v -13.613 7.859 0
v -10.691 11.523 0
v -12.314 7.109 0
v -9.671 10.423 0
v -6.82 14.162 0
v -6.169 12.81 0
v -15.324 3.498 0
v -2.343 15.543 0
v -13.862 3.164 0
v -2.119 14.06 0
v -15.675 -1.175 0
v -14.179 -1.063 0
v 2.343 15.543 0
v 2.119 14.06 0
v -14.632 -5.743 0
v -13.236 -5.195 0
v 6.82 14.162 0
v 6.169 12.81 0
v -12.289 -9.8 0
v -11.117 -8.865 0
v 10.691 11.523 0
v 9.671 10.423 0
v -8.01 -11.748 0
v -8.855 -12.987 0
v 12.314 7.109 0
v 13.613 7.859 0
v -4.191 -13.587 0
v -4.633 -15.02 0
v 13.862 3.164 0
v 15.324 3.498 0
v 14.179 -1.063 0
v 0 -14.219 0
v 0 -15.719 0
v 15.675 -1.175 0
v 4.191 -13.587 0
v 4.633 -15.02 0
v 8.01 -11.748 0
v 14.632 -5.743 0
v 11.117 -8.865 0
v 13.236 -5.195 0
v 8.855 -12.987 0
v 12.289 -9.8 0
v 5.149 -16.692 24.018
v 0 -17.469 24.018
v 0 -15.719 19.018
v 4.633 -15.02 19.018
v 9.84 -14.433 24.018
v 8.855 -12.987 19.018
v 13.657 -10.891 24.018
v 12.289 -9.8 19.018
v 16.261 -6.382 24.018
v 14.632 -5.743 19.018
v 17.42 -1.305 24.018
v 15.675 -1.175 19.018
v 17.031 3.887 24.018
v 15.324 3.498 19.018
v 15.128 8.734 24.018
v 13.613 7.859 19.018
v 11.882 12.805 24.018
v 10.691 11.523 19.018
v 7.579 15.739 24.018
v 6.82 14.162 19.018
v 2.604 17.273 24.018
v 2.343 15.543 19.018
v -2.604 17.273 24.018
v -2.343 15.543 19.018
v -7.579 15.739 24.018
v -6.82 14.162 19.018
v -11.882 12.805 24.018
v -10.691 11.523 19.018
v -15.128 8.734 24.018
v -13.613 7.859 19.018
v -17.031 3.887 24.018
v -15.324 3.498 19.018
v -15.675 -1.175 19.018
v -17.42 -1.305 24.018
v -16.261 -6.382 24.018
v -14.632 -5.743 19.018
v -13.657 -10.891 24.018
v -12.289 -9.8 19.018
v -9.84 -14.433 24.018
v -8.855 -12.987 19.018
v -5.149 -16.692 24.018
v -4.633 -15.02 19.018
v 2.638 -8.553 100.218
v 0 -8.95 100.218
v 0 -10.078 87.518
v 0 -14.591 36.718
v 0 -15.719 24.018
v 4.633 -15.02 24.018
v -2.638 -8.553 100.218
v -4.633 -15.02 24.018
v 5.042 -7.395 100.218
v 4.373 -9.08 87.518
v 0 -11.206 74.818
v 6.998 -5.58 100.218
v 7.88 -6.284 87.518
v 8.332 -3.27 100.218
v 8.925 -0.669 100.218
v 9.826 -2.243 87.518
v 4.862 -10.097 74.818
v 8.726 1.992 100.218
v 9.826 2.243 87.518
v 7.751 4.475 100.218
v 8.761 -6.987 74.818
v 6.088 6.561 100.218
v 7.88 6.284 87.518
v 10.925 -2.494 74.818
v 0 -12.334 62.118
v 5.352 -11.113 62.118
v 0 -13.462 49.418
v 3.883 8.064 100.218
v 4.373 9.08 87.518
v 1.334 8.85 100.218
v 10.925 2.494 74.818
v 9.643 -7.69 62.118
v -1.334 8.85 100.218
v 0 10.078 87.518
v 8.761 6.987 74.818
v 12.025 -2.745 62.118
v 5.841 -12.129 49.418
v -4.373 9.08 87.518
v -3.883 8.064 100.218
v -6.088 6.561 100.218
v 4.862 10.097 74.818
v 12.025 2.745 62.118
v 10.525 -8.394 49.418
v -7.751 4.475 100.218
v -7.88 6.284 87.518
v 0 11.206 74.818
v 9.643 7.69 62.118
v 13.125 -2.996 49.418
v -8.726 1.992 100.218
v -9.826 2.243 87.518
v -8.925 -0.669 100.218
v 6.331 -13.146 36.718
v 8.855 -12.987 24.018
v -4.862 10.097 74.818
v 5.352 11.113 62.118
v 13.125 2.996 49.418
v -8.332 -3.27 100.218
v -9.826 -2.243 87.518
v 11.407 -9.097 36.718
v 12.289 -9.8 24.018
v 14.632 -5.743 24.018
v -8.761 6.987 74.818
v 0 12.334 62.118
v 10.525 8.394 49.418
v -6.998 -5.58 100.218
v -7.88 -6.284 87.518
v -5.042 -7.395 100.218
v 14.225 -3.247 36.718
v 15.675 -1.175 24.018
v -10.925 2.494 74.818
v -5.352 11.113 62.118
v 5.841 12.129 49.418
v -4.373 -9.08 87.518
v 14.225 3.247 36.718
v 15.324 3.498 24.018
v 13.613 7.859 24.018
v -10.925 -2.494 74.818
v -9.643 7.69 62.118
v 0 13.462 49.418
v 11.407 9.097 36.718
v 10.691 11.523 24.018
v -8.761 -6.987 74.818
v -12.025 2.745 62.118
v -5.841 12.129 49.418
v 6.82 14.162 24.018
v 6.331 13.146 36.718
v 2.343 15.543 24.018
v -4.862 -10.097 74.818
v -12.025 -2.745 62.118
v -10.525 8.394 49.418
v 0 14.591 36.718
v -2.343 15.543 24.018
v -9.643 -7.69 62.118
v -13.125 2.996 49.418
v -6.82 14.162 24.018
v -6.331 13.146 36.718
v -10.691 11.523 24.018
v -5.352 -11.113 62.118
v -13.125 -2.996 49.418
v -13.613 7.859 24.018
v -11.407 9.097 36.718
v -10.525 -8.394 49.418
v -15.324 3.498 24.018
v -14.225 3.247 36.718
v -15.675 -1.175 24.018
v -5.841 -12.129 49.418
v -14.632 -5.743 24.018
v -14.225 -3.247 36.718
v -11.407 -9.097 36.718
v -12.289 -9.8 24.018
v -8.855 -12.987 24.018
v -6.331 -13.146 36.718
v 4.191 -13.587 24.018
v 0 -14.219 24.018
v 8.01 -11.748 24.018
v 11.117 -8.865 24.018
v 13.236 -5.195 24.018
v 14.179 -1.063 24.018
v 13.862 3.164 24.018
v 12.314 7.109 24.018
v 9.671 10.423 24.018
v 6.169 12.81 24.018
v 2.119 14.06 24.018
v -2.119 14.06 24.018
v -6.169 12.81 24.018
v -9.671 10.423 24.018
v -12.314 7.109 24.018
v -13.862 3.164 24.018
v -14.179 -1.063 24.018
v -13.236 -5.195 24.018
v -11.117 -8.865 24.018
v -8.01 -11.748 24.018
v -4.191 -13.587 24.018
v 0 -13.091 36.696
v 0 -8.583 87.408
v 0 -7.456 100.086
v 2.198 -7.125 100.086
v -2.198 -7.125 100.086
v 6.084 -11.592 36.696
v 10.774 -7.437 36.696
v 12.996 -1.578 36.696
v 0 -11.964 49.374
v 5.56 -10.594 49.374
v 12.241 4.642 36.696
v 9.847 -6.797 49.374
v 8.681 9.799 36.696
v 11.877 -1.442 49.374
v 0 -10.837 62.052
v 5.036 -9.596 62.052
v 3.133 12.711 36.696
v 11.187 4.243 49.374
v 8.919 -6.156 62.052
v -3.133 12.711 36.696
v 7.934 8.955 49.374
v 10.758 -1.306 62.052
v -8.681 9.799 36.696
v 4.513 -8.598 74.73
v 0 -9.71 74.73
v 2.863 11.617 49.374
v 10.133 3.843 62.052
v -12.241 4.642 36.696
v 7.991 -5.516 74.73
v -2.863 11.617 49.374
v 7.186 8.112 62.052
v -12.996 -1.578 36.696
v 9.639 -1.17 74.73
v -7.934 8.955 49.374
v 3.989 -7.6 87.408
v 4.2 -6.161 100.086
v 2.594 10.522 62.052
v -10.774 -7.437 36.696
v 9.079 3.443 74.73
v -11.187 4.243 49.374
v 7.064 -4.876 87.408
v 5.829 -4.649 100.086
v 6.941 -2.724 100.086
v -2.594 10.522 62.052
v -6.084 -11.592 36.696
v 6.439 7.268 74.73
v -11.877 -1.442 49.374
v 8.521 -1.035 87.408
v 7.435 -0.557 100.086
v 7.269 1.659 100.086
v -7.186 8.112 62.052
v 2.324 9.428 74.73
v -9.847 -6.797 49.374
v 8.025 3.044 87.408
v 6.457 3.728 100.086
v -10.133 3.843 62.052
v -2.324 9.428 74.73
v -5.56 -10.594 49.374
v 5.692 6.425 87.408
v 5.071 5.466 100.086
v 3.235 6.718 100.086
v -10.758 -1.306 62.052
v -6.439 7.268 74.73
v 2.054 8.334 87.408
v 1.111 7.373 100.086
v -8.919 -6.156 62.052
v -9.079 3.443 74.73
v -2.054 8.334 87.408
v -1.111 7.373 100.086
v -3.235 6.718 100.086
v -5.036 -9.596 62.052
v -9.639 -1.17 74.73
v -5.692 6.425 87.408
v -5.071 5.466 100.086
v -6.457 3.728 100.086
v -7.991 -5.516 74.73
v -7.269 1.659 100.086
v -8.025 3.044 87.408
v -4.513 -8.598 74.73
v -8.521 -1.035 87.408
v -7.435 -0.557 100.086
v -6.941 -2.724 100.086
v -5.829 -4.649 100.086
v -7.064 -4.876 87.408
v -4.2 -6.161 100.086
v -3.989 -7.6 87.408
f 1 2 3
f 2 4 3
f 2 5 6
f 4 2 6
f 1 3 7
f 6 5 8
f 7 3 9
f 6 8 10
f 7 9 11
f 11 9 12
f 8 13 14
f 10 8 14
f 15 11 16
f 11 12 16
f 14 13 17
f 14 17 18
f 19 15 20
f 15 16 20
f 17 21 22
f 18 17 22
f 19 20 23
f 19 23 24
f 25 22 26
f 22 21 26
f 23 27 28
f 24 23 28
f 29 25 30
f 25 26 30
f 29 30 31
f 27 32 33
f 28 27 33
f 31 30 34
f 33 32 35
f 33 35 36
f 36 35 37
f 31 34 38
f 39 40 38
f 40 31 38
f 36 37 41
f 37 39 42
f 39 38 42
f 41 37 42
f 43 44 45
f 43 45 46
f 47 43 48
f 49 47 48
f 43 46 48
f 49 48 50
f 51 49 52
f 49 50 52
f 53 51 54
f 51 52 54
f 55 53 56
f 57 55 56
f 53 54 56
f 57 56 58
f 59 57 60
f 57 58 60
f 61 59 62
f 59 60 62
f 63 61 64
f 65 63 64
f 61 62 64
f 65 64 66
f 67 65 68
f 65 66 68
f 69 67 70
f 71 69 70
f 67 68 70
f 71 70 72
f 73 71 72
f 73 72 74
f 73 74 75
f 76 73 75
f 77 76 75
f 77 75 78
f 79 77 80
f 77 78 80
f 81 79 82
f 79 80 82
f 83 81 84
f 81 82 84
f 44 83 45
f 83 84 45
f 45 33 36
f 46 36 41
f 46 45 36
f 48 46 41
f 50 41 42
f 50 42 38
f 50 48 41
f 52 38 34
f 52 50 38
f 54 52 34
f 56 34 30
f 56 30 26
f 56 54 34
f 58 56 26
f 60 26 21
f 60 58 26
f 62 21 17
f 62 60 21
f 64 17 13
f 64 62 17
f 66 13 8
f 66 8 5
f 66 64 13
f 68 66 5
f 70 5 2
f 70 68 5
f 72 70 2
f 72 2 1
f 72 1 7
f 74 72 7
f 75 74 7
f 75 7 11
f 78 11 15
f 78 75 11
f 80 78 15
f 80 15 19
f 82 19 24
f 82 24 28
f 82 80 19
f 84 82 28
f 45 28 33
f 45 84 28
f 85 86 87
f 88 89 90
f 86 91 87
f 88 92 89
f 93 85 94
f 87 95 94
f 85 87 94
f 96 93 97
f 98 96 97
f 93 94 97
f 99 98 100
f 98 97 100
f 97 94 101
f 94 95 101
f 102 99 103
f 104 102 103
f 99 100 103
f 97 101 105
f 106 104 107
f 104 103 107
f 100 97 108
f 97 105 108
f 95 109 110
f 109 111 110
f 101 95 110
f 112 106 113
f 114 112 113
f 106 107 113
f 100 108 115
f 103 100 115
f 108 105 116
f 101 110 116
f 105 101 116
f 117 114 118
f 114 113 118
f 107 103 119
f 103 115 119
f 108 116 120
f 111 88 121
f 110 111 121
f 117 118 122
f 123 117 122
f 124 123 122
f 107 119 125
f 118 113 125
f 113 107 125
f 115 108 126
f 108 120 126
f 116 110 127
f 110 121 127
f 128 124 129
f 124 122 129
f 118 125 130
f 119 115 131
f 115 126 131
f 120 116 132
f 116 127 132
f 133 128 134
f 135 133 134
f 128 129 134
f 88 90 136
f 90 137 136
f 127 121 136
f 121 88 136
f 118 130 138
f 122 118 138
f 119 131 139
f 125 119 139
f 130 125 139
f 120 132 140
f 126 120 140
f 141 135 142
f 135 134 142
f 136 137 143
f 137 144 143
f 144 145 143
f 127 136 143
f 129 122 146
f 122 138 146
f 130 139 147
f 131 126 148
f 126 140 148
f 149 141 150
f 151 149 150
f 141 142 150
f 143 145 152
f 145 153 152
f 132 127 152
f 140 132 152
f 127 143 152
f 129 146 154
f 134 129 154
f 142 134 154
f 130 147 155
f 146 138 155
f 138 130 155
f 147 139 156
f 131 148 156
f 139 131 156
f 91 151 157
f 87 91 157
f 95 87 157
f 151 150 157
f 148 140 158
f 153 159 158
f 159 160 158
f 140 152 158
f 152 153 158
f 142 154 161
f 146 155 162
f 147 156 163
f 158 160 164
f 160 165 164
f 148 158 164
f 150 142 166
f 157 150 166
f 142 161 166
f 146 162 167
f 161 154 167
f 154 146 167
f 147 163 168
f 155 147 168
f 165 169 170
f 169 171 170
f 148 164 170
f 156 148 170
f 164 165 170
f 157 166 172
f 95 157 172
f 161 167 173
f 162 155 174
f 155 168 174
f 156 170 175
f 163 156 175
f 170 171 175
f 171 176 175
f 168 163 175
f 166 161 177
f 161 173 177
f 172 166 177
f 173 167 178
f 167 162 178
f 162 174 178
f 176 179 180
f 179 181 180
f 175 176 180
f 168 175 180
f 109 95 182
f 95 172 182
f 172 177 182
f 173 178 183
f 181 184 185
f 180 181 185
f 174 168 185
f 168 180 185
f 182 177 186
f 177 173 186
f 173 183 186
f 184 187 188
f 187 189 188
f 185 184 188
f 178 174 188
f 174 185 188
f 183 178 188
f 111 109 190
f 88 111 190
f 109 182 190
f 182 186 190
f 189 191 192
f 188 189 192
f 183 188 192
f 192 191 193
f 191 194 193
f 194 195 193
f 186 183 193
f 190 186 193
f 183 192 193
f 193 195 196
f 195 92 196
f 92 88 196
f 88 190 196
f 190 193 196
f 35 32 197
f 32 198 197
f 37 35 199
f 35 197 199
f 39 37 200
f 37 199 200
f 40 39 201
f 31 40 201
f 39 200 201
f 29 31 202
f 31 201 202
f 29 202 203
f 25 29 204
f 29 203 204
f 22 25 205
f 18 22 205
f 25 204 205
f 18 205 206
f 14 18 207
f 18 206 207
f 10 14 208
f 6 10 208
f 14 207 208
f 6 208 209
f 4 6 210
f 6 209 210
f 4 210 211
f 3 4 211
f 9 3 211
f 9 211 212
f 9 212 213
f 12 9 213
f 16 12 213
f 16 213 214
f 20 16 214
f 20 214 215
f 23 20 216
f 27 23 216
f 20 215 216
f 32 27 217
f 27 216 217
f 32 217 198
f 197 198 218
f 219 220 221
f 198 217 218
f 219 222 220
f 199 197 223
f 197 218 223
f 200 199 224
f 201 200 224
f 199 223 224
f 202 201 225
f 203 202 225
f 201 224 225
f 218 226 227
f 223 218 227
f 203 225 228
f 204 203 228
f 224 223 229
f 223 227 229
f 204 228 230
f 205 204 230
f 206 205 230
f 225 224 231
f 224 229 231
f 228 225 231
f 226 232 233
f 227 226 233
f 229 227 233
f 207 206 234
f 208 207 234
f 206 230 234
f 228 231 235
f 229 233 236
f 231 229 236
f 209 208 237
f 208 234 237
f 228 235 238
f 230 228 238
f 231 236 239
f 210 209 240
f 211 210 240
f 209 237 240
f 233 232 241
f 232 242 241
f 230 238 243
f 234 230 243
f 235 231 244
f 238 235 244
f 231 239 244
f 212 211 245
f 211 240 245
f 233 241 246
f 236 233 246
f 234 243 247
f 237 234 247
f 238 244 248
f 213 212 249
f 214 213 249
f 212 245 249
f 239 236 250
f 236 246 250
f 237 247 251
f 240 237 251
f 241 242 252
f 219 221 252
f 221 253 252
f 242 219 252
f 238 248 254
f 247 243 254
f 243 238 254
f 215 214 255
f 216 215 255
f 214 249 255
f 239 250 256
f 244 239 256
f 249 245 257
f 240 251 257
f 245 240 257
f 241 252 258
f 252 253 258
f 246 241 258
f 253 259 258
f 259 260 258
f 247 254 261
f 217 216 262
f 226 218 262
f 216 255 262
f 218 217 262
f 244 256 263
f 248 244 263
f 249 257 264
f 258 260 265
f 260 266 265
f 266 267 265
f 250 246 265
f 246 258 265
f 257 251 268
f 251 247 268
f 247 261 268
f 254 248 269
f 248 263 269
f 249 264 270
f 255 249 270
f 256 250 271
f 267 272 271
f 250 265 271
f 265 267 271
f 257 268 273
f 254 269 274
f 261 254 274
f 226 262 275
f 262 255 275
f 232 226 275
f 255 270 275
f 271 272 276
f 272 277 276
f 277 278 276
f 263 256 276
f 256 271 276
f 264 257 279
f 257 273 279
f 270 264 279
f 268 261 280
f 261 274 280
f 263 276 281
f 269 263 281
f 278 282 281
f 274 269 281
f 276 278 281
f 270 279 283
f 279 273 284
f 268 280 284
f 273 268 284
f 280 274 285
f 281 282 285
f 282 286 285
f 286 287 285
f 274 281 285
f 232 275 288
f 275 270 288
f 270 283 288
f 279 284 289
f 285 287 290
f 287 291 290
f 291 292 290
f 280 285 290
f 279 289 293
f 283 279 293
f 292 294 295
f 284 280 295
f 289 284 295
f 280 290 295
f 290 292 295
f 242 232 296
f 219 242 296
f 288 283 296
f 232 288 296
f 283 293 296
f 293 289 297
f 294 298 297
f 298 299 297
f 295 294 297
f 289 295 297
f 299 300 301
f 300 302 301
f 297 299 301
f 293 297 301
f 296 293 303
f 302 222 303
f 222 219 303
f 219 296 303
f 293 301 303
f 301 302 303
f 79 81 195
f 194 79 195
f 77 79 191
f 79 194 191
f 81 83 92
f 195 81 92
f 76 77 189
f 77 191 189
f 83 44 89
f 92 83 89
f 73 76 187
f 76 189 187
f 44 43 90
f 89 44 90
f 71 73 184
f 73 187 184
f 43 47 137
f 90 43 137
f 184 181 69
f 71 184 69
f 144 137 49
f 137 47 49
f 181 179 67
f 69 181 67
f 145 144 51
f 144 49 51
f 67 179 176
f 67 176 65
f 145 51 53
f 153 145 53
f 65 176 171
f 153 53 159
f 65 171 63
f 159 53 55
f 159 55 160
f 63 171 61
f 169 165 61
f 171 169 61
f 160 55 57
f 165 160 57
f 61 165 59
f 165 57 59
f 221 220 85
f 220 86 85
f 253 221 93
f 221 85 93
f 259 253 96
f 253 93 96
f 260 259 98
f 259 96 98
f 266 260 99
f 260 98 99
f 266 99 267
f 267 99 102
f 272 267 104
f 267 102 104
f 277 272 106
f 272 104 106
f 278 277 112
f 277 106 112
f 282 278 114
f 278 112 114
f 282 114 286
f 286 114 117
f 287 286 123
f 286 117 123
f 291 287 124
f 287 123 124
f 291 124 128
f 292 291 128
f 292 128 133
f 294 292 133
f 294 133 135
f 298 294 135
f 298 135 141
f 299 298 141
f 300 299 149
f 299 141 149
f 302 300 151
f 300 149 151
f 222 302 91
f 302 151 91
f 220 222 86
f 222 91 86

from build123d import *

# Parameters (mm, degrees)
F1_W = 1.5
F1_H = 19.0184637904


with BuildPart() as f2:
    # F1 (on Right) → F2 (revolve)
    with BuildSketch(Plane.YZ):
        Polygon((-14.2185513526, 19.0184637904), (-14.2185513526, 24.0184637904), (-15.7185513526, 24.0184637904), (-17.4685513526, 24.0184637904), (-15.7185513526, 19.0184637904), align=None)
        Polygon((-15.7185513526, 24.0184637904), (-14.2185513526, 24.0184637904), (-7.4561595252, 100.0857525279), (-8.9502772316, 100.2184637904), align=None)
        with Locations((-14.9685513526, 9.5092318952)):
            Rectangle(F1_W, F1_H)
    revolve(axis=Axis((0, 0, 0), (0, 0, 1)))


solid = f2.part
